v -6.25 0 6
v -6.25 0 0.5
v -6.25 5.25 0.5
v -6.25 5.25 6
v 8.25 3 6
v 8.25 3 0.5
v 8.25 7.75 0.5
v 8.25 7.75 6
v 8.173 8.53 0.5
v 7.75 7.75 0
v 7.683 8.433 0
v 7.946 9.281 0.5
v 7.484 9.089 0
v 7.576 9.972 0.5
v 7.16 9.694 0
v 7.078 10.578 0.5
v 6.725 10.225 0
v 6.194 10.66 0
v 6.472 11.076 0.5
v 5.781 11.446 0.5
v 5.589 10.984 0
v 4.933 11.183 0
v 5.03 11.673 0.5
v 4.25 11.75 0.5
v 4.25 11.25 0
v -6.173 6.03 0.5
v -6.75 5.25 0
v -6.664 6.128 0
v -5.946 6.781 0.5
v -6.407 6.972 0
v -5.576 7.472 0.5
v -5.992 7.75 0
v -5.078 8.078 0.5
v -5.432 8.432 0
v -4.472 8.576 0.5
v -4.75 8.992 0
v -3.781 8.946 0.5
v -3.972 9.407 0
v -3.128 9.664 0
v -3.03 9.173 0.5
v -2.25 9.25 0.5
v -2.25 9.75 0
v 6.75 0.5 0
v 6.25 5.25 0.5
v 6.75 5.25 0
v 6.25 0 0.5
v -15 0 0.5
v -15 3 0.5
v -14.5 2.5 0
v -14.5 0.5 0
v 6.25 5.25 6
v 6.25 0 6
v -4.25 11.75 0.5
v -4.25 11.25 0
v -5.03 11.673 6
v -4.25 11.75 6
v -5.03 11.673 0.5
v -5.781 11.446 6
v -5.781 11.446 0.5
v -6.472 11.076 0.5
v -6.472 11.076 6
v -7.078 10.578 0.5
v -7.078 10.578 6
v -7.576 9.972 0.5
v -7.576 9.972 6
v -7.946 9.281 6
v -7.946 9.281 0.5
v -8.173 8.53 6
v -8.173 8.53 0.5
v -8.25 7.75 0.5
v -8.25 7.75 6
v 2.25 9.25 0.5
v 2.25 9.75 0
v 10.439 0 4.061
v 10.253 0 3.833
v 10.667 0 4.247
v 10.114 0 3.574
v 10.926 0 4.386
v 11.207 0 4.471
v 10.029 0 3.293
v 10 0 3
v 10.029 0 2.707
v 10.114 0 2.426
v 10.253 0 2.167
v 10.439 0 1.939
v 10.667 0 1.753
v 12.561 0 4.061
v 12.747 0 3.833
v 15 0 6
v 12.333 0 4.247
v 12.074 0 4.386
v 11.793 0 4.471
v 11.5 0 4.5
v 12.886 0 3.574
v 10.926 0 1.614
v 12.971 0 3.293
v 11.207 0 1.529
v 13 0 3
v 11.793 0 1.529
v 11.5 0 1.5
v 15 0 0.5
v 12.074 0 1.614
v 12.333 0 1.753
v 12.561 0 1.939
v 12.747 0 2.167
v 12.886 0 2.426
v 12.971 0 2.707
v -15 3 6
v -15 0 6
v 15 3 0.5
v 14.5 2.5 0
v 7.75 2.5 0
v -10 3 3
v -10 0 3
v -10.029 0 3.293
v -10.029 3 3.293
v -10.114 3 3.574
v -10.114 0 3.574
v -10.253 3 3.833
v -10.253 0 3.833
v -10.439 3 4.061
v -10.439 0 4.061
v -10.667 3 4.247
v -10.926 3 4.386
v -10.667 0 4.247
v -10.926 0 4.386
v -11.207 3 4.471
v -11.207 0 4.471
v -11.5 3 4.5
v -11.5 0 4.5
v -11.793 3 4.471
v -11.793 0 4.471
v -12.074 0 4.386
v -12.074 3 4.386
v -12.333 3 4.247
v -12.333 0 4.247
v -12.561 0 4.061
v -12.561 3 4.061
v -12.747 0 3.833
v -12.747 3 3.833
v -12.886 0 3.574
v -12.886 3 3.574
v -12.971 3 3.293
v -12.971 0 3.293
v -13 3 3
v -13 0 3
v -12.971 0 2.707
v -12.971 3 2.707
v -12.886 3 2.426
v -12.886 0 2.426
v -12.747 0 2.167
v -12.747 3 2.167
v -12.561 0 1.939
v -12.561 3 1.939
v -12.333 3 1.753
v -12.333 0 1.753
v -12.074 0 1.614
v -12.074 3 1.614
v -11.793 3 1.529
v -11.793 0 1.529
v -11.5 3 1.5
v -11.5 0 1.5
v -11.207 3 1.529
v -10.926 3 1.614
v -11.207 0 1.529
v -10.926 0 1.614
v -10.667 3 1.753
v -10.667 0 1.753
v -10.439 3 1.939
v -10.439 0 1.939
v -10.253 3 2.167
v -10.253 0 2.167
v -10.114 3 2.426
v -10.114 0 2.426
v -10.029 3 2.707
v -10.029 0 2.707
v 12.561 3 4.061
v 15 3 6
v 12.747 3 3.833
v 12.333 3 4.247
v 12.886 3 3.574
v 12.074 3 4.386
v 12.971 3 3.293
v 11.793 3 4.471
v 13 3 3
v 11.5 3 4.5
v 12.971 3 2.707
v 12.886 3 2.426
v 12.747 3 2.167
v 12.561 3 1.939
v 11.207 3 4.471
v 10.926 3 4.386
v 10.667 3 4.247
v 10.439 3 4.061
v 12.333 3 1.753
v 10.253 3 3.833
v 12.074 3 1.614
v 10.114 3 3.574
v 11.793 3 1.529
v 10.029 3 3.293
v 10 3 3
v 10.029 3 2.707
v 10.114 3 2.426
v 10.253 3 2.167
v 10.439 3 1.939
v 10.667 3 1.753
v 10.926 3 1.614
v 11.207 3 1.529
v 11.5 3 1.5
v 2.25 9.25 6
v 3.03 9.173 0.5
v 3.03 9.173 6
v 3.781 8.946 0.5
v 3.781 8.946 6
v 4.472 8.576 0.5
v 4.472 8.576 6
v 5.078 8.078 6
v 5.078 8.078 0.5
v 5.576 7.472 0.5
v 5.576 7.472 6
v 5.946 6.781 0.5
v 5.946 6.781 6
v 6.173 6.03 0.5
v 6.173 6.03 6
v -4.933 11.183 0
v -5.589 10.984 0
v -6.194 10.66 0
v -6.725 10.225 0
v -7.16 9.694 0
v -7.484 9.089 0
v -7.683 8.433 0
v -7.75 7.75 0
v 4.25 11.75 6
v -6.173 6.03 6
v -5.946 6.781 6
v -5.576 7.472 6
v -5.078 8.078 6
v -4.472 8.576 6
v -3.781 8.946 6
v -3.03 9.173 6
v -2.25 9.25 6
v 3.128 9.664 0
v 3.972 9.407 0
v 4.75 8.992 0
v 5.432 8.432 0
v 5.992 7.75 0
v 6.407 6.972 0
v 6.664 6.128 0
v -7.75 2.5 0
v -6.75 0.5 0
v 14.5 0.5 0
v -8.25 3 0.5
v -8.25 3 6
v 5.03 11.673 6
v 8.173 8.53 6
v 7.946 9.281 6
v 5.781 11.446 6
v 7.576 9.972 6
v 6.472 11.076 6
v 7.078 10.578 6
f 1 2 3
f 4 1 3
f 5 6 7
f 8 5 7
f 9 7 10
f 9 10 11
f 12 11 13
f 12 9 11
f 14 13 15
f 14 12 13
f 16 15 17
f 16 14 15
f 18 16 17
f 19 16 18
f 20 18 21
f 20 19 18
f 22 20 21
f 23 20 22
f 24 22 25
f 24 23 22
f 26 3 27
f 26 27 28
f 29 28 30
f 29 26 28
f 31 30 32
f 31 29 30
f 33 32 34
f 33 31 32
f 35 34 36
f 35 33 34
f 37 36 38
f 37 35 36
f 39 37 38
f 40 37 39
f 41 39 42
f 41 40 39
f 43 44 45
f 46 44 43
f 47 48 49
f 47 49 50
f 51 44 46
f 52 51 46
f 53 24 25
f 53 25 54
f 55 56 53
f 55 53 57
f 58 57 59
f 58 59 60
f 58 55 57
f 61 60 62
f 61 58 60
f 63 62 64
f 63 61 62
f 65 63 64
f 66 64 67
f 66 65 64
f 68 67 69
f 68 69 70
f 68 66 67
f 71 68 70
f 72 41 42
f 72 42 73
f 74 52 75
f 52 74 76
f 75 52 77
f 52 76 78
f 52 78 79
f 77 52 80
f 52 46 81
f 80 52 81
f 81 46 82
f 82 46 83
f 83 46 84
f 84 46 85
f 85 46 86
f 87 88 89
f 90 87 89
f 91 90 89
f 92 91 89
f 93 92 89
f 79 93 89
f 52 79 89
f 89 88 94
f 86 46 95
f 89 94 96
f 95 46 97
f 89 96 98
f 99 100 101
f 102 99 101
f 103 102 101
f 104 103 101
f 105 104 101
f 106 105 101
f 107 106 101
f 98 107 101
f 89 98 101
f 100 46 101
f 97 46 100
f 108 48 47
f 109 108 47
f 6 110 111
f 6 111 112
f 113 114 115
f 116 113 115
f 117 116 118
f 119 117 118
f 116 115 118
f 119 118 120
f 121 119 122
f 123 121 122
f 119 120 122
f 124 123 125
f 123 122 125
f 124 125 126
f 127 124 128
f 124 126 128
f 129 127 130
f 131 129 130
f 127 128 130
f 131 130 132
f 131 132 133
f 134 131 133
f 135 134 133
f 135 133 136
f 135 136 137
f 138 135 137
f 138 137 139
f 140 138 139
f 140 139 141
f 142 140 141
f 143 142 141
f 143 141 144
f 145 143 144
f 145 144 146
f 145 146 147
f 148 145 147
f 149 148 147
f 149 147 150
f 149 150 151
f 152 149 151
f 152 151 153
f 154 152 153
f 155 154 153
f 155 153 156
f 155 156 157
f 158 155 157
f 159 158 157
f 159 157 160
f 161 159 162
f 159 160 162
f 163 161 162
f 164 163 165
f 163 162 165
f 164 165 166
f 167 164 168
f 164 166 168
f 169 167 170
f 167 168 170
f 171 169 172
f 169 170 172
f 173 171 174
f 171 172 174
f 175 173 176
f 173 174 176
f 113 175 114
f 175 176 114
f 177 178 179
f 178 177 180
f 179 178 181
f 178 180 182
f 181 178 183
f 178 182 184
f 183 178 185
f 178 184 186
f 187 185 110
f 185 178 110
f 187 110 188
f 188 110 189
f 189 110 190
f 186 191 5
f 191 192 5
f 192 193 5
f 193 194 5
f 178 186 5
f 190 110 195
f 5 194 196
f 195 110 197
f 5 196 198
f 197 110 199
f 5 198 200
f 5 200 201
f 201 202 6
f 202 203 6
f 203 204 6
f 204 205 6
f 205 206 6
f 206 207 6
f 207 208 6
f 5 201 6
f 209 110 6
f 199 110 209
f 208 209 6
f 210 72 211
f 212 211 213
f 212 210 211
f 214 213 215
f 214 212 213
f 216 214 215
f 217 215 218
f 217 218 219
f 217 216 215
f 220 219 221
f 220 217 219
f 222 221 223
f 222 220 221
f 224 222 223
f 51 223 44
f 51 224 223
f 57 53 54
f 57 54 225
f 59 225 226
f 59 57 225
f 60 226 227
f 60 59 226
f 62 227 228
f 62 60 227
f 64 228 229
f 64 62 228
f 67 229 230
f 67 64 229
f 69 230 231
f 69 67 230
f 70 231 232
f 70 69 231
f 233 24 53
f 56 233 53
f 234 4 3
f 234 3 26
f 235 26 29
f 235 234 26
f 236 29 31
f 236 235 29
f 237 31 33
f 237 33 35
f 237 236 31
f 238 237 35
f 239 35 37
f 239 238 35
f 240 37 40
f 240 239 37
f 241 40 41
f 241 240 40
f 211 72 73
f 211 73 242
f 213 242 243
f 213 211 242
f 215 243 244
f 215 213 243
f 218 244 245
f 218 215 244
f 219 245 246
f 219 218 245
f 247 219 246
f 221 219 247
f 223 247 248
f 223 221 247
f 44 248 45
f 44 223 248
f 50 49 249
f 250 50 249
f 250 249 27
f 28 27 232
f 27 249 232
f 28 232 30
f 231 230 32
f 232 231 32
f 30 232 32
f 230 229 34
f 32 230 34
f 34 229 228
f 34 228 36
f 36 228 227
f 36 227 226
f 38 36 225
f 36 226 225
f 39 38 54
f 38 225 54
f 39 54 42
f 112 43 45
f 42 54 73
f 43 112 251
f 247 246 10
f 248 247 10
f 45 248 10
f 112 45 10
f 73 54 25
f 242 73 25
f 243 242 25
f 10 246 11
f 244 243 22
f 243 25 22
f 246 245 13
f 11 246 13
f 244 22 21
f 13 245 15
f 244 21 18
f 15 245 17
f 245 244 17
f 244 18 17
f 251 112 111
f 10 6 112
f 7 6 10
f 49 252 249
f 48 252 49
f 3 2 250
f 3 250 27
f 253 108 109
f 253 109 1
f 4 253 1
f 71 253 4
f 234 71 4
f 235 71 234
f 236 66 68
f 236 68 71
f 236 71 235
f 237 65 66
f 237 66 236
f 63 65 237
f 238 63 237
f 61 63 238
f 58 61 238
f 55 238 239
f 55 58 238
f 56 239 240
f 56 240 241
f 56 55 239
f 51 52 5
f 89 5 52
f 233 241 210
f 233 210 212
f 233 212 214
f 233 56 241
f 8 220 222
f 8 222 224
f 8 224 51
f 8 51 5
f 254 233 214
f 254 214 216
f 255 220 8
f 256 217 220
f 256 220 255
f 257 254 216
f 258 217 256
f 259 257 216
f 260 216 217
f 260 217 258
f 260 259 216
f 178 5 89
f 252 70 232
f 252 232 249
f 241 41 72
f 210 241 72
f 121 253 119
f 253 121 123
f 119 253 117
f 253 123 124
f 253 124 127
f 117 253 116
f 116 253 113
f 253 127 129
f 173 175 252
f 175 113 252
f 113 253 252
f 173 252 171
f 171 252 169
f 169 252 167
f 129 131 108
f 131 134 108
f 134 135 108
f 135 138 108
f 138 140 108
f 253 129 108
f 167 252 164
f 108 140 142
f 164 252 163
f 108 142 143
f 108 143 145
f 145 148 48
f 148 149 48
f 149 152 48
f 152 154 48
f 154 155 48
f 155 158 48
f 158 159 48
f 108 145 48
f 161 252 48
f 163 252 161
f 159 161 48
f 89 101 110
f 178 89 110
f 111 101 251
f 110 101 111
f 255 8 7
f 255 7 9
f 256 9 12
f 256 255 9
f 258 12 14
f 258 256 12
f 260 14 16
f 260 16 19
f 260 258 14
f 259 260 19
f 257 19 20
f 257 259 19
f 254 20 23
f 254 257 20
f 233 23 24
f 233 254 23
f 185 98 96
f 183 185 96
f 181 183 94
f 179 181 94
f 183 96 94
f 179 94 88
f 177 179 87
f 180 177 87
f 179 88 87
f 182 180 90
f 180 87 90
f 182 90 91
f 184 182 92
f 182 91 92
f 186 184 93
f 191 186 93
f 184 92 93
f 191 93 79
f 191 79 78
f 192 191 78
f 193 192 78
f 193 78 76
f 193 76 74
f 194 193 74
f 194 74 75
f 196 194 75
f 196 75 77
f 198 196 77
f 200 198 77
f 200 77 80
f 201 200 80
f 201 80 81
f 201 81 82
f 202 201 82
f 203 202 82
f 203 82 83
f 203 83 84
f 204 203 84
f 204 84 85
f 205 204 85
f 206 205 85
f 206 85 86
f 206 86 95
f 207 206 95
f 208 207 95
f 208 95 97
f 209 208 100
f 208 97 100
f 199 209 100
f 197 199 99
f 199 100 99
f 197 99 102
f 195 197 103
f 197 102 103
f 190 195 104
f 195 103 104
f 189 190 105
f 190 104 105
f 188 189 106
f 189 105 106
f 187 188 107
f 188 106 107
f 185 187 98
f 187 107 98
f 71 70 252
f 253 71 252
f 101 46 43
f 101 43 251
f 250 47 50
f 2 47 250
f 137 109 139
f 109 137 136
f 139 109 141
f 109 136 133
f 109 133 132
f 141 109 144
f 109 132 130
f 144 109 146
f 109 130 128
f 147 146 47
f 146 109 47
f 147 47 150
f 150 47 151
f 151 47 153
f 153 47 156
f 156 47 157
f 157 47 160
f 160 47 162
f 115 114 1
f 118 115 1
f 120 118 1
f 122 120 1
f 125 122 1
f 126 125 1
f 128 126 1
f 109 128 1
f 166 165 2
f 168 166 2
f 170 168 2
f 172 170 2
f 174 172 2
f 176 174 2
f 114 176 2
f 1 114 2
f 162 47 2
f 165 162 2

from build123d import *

# Parameters (mm, degrees)
PAD_DEPTH    = 6
SKETCH001_R  = 1.5
POCKET_DEPTH = 5
FILLET_R     = 4
CHAMFER_SIZE = 0.5


with BuildPart() as part:
    # Sketch → Pad (new body)
    with BuildSketch(Plane.XY):
        Polygon((-15, 0), (-6.25, 0), (-6.25, 9.25), (6.25, 9.25), (6.25, 0), (15, 0), (15, 3), (8.25, 3), (8.25, 11.75), (-8.25, 11.75), (-8.25, 3), (-15, 3), align=None)
    extrude(amount=PAD_DEPTH)

    # Sketch001 → Pocket (cut)
    with BuildSketch(Plane.XZ):
        with Locations((-11.5, 3)):
            Circle(SKETCH001_R)
        with Locations((11.5, 3)):
            Circle(SKETCH001_R)
    extrude(amount=-POCKET_DEPTH, mode=Mode.SUBTRACT)

    # Fillet
    fillet_edges = [part.edges().sort_by_distance(p)[0] for p in [
        (6.25, 9.25, 3),
        (-6.25, 9.25, 3),
        (-8.25, 11.75, 3),
        (8.25, 11.75, 3),
    ]]
    fillet(fillet_edges, radius=FILLET_R)

    # Chamfer
    chamfer_edges = [part.edges().sort_by_distance(p)[0] for p in [
        (-6.25, 2.625, 0),
        (-5.078427, 8.078427, 0),
        (-10.625, 0, 0),
        (0, 9.25, 0),
        (-15, 1.5, 0),
        (5.078427, 8.078427, 0),
        (-11.625, 3, 0),
        (6.25, 2.625, 0),
        (-8.25, 5.375, 0),
        (10.625, 0, 0),
        (-7.078427, 10.578427, 0),
        (15, 1.5, 0),
        (0, 11.75, 0),
        (11.625, 3, 0),
        (7.078427, 10.578427, 0),
        (8.25, 5.375, 0),
    ]]
    chamfer(chamfer_edges, length=CHAMFER_SIZE)


solid = part.part
